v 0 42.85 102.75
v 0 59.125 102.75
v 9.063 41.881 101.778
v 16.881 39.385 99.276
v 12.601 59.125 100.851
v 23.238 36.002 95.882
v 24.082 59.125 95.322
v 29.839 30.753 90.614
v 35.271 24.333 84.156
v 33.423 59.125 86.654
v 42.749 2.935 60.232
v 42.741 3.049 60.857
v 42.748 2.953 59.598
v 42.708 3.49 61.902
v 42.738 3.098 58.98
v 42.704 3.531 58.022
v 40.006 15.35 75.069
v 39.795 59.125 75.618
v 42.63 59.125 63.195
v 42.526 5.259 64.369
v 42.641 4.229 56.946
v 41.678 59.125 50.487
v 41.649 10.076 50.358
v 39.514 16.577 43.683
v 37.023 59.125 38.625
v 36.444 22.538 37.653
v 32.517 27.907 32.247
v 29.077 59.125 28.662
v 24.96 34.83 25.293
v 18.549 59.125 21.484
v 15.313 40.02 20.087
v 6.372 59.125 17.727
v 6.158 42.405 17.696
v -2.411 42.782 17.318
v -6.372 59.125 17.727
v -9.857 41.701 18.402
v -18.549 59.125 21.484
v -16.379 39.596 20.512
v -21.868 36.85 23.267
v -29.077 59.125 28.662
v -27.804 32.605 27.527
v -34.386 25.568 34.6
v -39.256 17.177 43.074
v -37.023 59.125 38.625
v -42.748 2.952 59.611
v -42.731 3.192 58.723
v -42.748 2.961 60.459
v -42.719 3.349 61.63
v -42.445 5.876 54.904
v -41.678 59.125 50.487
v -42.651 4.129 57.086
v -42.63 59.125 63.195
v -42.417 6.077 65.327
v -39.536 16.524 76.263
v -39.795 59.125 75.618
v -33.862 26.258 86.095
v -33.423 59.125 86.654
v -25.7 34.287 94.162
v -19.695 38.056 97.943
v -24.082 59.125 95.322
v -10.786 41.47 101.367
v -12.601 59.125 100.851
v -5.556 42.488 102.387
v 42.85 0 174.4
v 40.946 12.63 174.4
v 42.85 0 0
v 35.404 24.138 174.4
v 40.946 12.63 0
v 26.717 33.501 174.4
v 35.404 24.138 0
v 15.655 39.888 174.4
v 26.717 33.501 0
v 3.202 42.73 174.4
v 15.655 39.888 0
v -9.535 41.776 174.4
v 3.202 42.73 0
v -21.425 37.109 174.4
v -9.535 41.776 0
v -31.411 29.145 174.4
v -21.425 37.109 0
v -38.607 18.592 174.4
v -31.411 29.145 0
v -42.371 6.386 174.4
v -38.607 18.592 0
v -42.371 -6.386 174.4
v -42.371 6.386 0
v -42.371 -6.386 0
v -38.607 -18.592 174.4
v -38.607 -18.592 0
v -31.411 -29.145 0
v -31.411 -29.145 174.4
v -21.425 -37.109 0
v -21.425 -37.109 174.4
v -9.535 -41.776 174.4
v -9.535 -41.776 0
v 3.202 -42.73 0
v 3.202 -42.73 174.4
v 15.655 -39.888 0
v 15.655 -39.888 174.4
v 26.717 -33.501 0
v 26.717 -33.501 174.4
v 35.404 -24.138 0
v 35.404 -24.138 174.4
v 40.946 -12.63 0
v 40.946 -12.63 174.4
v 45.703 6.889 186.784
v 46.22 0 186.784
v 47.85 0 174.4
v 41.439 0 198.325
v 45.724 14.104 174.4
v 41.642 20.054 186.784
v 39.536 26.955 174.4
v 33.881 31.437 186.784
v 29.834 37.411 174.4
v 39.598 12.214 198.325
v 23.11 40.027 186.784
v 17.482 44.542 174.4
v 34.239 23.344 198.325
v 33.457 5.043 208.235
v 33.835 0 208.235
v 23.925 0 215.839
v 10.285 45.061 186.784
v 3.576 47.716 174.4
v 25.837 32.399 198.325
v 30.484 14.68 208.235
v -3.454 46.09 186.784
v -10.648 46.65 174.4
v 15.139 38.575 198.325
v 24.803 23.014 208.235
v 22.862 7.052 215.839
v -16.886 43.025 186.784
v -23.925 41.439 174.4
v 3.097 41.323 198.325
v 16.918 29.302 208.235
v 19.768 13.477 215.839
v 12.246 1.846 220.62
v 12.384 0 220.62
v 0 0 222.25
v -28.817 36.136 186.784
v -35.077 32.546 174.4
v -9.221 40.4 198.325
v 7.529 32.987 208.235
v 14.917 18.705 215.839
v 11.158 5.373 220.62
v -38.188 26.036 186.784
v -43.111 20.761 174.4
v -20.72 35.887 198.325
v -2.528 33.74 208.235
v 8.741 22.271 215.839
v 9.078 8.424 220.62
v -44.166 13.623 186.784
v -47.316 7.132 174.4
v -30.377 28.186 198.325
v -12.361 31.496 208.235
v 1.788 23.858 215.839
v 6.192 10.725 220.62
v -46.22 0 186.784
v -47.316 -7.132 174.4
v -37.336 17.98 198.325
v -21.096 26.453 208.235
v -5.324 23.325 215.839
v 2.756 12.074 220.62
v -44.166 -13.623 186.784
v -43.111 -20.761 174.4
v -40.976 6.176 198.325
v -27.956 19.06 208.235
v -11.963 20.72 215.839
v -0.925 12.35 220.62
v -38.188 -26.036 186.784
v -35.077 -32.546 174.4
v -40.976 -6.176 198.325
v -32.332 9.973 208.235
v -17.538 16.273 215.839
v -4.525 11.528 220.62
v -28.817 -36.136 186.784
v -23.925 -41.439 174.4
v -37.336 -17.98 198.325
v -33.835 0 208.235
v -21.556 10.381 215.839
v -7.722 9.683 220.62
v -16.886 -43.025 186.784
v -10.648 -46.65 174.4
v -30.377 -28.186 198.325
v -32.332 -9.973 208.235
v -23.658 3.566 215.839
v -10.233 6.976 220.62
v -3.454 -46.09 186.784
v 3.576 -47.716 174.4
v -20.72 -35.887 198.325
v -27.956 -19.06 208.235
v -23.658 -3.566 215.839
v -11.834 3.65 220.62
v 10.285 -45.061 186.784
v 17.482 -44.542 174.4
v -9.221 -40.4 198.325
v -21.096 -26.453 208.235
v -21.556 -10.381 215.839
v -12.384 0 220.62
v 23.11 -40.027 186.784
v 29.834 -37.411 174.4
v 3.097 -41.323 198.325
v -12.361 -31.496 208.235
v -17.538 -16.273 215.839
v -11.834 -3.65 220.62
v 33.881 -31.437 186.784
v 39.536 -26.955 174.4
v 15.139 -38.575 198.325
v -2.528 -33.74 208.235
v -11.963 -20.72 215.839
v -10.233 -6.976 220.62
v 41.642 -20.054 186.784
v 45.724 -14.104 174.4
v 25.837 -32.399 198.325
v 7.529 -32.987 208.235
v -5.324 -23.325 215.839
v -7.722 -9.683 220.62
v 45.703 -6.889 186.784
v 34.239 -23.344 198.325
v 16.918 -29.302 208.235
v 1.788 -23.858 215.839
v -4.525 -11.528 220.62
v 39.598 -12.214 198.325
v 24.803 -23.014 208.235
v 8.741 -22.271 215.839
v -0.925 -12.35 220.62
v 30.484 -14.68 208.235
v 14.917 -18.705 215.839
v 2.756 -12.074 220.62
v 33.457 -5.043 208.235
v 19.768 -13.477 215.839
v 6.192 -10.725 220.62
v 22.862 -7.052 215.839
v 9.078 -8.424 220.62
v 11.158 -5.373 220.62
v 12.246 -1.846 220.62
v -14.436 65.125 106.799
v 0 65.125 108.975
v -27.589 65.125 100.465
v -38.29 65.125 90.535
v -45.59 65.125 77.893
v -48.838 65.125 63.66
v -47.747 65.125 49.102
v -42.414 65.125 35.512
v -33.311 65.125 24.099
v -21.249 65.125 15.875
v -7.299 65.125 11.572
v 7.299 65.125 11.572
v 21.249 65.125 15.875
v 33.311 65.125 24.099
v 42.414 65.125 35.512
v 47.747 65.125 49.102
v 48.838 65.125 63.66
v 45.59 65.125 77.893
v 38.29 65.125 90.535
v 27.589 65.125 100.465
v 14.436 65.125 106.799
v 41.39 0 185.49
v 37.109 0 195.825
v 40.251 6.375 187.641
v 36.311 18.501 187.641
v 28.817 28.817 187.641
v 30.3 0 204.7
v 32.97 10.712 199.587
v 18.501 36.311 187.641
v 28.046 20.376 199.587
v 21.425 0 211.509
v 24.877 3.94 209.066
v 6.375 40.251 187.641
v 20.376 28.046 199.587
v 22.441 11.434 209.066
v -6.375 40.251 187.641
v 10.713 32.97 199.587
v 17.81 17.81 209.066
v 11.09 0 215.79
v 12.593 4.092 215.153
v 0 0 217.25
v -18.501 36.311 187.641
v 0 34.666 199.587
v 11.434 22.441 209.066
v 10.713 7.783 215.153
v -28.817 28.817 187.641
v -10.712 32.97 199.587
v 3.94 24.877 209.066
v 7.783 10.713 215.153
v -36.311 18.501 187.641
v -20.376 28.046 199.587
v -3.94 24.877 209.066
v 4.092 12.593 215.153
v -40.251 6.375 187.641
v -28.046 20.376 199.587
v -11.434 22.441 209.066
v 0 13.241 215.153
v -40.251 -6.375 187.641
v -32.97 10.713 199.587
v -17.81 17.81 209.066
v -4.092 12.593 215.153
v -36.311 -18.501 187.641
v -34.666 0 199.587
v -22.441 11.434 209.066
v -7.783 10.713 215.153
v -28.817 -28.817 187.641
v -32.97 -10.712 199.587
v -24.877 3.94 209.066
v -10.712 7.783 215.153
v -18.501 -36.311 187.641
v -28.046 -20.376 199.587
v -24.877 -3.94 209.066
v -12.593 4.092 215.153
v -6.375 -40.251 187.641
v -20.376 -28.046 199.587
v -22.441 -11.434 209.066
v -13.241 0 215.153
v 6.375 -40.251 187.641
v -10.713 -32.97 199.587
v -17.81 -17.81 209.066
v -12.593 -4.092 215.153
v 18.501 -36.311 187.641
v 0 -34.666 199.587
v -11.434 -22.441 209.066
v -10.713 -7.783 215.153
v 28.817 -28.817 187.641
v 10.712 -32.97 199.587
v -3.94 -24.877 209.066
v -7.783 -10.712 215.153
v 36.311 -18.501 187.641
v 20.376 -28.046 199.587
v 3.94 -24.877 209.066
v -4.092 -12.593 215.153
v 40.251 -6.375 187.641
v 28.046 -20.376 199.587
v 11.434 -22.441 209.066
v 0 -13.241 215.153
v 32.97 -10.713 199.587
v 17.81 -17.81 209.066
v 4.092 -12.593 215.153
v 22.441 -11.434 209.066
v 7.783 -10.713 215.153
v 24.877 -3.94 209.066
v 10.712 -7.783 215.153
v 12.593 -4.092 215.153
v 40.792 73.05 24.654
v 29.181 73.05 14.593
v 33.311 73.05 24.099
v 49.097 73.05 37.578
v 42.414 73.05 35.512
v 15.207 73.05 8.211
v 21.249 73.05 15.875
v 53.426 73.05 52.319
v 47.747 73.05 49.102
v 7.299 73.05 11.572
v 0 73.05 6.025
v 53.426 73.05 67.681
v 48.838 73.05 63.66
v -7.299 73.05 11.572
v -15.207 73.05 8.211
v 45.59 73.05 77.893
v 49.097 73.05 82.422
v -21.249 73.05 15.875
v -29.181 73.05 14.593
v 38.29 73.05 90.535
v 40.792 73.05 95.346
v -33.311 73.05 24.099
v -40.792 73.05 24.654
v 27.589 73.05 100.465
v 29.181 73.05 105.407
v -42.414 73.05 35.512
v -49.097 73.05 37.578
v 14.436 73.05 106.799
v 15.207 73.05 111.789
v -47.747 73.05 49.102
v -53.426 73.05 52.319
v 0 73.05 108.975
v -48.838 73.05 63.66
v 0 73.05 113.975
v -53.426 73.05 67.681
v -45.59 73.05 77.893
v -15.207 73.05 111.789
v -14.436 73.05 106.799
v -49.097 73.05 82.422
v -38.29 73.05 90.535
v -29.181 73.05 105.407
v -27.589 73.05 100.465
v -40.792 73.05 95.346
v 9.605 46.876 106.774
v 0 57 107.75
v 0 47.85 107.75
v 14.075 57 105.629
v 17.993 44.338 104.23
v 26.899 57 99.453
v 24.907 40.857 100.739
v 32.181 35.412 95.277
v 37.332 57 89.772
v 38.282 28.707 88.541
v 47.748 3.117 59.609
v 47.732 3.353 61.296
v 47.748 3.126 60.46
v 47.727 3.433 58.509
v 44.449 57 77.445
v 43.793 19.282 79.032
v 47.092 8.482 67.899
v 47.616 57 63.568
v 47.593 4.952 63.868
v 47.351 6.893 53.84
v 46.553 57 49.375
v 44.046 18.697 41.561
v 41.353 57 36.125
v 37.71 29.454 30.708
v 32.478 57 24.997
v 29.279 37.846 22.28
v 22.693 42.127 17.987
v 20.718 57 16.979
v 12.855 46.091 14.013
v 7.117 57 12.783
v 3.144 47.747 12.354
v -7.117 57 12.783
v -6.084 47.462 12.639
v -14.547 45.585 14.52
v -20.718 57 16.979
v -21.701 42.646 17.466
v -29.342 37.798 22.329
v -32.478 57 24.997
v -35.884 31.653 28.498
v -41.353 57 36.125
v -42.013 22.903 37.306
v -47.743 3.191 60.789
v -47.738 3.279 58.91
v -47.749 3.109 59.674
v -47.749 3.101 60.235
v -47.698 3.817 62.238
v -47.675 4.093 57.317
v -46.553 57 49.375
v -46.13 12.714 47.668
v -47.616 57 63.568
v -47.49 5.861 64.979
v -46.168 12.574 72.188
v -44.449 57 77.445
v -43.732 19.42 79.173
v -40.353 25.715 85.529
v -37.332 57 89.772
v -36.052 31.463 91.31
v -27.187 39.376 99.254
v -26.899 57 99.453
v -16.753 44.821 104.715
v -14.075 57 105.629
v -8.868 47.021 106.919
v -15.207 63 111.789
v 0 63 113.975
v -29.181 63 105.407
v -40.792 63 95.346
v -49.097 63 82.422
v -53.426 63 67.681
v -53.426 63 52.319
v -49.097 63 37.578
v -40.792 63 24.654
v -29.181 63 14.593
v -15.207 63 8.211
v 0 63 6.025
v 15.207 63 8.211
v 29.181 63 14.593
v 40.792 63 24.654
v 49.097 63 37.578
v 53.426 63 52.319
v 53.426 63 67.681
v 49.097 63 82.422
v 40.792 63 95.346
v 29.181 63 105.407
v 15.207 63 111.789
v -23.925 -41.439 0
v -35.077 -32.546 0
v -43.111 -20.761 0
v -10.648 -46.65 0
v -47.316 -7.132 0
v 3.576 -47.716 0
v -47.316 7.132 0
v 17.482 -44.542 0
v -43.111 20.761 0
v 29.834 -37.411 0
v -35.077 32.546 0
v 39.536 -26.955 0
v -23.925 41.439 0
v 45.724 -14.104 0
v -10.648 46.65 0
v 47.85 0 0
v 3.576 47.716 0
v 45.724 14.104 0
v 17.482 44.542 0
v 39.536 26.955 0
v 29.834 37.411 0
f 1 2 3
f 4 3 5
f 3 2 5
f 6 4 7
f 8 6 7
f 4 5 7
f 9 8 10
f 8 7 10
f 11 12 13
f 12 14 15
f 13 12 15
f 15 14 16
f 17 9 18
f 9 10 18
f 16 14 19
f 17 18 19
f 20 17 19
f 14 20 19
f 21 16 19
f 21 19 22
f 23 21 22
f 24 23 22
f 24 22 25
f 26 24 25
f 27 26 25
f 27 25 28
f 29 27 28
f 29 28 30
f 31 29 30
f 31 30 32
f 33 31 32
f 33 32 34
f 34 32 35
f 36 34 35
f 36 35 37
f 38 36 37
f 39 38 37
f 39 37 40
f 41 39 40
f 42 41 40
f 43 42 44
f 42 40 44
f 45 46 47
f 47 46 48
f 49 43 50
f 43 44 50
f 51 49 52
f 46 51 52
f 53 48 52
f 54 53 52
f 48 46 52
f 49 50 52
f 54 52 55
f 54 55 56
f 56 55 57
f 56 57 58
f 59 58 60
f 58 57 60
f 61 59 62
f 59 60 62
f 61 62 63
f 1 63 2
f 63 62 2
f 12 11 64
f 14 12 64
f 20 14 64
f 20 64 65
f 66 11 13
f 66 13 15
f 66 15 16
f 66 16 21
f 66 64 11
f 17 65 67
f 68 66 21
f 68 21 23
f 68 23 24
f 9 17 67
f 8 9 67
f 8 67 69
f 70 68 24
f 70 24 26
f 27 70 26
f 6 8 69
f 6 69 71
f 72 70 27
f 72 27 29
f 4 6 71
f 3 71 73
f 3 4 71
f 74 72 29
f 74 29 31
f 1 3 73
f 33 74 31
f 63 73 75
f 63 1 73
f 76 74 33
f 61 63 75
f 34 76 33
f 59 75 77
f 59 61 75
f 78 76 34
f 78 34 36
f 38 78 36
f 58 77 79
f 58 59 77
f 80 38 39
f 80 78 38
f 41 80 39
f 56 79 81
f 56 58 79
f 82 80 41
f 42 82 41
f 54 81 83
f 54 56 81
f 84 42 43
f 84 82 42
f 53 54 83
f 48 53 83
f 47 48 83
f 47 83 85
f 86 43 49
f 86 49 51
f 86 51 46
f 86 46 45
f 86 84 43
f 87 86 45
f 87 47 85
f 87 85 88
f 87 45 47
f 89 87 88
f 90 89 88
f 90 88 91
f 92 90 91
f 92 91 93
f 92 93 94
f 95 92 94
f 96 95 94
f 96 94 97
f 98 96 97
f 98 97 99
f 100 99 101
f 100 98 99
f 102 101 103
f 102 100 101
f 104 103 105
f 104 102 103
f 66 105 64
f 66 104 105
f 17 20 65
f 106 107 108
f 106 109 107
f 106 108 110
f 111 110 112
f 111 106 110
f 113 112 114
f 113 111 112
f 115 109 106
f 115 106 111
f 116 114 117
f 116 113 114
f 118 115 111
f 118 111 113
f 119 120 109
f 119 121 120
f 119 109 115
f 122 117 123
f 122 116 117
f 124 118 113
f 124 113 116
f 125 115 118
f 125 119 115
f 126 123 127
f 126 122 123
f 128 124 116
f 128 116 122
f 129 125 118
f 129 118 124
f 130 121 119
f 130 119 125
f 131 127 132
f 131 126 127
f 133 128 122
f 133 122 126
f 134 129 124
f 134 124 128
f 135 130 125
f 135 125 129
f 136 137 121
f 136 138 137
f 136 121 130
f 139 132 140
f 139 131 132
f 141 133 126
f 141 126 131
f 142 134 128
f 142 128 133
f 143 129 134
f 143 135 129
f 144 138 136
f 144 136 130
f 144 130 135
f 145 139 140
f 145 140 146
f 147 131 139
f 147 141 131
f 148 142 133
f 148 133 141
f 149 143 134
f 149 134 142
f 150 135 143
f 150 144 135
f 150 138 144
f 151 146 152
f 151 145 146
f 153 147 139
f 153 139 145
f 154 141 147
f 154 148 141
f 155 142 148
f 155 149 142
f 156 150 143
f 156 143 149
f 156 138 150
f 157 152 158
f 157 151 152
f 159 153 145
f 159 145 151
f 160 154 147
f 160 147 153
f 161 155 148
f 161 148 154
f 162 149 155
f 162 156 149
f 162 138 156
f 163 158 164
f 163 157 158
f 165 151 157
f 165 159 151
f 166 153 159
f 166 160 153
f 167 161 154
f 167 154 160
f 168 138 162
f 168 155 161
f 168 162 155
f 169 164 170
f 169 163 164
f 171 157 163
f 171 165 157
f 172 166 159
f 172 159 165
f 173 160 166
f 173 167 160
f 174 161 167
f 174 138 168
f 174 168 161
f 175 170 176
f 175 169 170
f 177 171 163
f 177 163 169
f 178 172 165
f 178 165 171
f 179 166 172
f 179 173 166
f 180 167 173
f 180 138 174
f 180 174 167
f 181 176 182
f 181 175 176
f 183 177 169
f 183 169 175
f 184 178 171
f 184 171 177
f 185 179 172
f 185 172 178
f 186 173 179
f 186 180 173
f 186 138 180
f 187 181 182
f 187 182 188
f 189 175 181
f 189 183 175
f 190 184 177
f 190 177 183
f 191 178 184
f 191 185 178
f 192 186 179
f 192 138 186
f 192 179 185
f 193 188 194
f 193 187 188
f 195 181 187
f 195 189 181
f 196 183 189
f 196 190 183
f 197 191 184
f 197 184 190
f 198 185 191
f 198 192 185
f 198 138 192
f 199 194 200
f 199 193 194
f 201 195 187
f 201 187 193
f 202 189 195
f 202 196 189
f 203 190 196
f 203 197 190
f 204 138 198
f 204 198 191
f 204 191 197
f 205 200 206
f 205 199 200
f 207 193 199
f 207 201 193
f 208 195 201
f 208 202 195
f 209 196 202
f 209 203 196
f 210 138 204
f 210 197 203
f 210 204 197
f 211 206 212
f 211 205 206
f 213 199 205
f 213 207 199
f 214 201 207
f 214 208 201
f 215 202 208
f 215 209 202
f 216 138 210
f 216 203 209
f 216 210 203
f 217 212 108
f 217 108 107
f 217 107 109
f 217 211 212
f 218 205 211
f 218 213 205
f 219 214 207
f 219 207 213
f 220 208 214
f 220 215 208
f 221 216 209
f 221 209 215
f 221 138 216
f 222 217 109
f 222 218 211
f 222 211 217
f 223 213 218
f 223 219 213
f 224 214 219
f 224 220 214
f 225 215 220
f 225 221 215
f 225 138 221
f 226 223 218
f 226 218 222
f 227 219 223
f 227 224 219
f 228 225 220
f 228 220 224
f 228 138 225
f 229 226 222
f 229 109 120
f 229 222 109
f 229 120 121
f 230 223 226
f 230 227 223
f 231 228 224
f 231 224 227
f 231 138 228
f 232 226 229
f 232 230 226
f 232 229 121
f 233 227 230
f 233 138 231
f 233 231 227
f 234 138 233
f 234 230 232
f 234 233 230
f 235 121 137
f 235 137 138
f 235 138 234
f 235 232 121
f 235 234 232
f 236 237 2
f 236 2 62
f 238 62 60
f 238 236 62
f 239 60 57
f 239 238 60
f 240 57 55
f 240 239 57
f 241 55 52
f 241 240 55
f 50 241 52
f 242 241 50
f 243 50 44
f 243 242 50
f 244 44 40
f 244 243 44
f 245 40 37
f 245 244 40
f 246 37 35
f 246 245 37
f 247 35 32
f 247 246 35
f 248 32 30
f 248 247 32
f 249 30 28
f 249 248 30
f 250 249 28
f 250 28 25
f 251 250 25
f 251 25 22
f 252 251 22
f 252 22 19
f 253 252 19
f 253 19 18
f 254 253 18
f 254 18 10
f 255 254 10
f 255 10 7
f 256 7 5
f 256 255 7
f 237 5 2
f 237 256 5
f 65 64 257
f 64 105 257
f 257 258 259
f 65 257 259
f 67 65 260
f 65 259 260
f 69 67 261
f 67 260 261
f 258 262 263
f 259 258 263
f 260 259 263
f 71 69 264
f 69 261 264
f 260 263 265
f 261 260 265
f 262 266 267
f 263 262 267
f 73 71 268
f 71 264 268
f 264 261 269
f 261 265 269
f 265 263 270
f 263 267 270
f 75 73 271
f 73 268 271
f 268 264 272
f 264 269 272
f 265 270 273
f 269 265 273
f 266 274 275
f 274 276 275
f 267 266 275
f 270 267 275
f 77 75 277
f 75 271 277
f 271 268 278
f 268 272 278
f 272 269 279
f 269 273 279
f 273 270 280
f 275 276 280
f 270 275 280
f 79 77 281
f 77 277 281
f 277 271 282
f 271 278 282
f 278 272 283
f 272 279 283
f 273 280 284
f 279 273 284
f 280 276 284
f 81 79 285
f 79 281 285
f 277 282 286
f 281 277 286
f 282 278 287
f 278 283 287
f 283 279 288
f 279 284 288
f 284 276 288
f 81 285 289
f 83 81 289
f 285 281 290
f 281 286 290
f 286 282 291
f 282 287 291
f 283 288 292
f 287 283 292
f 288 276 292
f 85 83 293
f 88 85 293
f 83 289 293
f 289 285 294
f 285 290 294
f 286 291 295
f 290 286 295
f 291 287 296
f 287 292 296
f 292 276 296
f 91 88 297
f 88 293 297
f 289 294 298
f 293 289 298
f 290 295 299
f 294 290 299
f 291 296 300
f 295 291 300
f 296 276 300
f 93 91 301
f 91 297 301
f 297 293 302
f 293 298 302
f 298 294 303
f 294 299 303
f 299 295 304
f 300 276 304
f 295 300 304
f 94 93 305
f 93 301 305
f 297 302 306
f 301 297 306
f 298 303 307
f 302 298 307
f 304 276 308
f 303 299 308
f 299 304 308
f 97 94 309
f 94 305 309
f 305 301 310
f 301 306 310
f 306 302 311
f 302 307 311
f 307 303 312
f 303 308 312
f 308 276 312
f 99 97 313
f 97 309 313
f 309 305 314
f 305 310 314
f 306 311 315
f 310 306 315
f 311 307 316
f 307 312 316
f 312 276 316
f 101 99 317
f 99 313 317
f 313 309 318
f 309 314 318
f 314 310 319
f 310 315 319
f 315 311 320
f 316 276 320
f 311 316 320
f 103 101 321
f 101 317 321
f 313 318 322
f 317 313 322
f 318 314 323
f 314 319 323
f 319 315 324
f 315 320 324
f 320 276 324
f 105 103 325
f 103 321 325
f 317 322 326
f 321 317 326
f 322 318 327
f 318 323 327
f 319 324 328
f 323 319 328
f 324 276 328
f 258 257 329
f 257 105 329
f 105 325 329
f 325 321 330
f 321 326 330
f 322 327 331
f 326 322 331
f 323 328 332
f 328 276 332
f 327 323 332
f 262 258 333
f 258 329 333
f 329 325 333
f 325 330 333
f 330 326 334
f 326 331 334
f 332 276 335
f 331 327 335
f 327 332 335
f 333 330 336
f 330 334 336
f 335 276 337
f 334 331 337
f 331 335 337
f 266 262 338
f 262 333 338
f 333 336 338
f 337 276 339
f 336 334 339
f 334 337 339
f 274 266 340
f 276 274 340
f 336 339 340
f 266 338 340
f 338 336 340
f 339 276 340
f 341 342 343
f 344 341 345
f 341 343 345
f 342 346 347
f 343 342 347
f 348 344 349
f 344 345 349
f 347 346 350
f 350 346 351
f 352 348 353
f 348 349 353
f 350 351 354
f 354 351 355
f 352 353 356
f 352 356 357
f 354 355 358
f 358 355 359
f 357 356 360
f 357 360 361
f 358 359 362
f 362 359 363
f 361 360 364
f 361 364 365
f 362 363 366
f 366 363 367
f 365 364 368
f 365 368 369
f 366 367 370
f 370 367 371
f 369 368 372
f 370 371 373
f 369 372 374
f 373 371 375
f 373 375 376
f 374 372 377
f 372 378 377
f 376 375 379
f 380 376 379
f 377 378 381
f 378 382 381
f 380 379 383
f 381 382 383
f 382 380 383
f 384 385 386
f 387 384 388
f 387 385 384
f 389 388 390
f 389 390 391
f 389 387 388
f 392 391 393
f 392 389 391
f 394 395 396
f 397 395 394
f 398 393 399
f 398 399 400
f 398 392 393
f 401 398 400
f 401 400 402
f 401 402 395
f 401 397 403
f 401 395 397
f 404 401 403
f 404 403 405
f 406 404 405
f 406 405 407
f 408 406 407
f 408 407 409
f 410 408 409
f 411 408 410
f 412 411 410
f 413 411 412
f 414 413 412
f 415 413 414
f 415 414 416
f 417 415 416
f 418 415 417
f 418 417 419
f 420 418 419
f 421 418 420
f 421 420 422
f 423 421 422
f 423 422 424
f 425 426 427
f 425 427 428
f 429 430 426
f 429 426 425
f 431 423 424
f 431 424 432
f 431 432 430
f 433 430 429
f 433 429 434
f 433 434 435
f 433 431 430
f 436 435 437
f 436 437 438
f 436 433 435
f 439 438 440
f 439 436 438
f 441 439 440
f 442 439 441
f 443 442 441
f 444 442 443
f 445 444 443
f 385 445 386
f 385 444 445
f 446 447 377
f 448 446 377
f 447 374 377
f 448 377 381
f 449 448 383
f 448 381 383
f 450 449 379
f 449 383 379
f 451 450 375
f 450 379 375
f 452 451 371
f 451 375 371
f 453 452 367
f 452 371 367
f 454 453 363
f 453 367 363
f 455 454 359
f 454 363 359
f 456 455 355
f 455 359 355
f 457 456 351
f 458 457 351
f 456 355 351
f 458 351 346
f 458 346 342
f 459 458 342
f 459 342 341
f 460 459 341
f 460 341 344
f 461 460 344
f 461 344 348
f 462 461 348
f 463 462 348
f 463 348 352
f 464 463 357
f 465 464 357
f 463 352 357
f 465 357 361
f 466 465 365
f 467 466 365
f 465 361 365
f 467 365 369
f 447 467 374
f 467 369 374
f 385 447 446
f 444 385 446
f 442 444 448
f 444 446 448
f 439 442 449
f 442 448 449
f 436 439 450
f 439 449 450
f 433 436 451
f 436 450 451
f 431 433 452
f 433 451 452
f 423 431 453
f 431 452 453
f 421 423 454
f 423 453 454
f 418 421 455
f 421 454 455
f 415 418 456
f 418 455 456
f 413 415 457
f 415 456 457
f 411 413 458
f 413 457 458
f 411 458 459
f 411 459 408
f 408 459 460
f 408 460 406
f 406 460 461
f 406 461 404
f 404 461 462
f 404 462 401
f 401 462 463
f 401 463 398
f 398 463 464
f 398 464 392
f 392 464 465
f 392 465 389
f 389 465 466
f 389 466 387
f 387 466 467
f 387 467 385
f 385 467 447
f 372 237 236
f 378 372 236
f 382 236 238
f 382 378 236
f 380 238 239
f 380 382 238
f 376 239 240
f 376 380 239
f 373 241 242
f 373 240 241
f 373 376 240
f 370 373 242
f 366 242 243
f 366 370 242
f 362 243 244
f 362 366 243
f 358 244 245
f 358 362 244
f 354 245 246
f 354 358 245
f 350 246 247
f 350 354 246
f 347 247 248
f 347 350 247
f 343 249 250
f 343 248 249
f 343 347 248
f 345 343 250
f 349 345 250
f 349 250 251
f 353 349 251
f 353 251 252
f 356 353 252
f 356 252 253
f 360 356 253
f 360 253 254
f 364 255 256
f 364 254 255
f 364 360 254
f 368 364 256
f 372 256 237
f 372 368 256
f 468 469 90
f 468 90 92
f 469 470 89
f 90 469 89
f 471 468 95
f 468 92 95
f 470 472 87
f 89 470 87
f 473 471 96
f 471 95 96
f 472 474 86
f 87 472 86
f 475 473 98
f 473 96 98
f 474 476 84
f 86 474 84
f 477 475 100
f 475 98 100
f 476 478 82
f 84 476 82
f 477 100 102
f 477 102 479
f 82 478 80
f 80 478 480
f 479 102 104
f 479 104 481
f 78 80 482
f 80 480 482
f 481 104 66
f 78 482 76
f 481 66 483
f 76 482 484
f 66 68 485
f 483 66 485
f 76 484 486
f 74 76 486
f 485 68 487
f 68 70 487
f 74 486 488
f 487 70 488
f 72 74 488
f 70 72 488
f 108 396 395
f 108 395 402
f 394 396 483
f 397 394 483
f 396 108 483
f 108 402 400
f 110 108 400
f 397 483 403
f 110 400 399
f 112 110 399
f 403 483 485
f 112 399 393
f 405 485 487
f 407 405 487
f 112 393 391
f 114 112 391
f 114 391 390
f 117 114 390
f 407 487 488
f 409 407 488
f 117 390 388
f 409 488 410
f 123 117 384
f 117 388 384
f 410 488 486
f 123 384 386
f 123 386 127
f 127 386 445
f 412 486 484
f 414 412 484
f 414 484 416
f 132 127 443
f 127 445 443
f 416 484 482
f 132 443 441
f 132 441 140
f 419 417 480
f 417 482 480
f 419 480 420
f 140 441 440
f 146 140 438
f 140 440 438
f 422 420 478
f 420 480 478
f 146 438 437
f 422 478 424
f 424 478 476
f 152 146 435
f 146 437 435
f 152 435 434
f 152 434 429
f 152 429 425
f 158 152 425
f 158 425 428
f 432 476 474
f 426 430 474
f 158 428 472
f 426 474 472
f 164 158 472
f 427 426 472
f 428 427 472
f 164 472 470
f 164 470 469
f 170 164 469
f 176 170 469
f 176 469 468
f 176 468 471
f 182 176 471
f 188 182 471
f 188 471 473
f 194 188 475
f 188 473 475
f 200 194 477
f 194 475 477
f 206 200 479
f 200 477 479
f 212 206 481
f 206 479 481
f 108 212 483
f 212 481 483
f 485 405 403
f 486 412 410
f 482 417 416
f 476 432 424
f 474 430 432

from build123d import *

# Parameters (mm, degrees)
SKETCH1_R           = 47.85
BOSS_EXTRUDE1_DEPTH = 222.25
SKETCH2_R           = 47.75
BOSS_EXTRUDE2_DEPTH = 57
FILLET1_R           = 47.85
SHELL1_T            = -5


with BuildPart() as part:
    # Sketch1 → Boss-Extrude1 (new body)
    with BuildSketch(Plane.XY):
        Circle(SKETCH1_R)
    extrude(amount=BOSS_EXTRUDE1_DEPTH)

    # Sketch2 → Boss-Extrude2 (add)
    with BuildSketch(Plane(origin=(0, 57, 0), x_dir=(1, 0, 0), z_dir=(0, 1, 0))):
        with Locations(Location((0, -60, 0), (0, 0, 270))):
            Circle(SKETCH2_R)
    extrude(amount=-BOSS_EXTRUDE2_DEPTH)

    # Sketch5 → Revolve3 (revolve)
    with BuildSketch(Plane(origin=(0, 0, 0), x_dir=(0, 0, -1), z_dir=(1, 0, 0)), mode=Mode.PRIVATE) as revolve3_sk:
        Polygon((-60, 57), (-12.25, 57), (-6.025, 63), (-6.025, 73.05), (-60, 73.05), align=None)
    revolve(revolve3_sk.sketch.rotate(Axis((0, 73.05, 60), (0, -1, 0)), 180), axis=Axis((0, 73.05, 60), (0, -1, 0)))

    # Fillet1
    fillet1_edges = [part.edges().sort_by_distance(p)[0] for p in [
        (-47.85, 0, 222.25),
    ]]
    fillet(fillet1_edges, radius=FILLET1_R)

    # Shell1
    shell1_openings = [part.faces().sort_by_distance(p)[0] for p in [
        (0, 73.05, 60),
        (0, 0, 0),
    ]]
    offset(amount=SHELL1_T, openings=shell1_openings, kind=Kind.INTERSECTION)


solid = part.part
